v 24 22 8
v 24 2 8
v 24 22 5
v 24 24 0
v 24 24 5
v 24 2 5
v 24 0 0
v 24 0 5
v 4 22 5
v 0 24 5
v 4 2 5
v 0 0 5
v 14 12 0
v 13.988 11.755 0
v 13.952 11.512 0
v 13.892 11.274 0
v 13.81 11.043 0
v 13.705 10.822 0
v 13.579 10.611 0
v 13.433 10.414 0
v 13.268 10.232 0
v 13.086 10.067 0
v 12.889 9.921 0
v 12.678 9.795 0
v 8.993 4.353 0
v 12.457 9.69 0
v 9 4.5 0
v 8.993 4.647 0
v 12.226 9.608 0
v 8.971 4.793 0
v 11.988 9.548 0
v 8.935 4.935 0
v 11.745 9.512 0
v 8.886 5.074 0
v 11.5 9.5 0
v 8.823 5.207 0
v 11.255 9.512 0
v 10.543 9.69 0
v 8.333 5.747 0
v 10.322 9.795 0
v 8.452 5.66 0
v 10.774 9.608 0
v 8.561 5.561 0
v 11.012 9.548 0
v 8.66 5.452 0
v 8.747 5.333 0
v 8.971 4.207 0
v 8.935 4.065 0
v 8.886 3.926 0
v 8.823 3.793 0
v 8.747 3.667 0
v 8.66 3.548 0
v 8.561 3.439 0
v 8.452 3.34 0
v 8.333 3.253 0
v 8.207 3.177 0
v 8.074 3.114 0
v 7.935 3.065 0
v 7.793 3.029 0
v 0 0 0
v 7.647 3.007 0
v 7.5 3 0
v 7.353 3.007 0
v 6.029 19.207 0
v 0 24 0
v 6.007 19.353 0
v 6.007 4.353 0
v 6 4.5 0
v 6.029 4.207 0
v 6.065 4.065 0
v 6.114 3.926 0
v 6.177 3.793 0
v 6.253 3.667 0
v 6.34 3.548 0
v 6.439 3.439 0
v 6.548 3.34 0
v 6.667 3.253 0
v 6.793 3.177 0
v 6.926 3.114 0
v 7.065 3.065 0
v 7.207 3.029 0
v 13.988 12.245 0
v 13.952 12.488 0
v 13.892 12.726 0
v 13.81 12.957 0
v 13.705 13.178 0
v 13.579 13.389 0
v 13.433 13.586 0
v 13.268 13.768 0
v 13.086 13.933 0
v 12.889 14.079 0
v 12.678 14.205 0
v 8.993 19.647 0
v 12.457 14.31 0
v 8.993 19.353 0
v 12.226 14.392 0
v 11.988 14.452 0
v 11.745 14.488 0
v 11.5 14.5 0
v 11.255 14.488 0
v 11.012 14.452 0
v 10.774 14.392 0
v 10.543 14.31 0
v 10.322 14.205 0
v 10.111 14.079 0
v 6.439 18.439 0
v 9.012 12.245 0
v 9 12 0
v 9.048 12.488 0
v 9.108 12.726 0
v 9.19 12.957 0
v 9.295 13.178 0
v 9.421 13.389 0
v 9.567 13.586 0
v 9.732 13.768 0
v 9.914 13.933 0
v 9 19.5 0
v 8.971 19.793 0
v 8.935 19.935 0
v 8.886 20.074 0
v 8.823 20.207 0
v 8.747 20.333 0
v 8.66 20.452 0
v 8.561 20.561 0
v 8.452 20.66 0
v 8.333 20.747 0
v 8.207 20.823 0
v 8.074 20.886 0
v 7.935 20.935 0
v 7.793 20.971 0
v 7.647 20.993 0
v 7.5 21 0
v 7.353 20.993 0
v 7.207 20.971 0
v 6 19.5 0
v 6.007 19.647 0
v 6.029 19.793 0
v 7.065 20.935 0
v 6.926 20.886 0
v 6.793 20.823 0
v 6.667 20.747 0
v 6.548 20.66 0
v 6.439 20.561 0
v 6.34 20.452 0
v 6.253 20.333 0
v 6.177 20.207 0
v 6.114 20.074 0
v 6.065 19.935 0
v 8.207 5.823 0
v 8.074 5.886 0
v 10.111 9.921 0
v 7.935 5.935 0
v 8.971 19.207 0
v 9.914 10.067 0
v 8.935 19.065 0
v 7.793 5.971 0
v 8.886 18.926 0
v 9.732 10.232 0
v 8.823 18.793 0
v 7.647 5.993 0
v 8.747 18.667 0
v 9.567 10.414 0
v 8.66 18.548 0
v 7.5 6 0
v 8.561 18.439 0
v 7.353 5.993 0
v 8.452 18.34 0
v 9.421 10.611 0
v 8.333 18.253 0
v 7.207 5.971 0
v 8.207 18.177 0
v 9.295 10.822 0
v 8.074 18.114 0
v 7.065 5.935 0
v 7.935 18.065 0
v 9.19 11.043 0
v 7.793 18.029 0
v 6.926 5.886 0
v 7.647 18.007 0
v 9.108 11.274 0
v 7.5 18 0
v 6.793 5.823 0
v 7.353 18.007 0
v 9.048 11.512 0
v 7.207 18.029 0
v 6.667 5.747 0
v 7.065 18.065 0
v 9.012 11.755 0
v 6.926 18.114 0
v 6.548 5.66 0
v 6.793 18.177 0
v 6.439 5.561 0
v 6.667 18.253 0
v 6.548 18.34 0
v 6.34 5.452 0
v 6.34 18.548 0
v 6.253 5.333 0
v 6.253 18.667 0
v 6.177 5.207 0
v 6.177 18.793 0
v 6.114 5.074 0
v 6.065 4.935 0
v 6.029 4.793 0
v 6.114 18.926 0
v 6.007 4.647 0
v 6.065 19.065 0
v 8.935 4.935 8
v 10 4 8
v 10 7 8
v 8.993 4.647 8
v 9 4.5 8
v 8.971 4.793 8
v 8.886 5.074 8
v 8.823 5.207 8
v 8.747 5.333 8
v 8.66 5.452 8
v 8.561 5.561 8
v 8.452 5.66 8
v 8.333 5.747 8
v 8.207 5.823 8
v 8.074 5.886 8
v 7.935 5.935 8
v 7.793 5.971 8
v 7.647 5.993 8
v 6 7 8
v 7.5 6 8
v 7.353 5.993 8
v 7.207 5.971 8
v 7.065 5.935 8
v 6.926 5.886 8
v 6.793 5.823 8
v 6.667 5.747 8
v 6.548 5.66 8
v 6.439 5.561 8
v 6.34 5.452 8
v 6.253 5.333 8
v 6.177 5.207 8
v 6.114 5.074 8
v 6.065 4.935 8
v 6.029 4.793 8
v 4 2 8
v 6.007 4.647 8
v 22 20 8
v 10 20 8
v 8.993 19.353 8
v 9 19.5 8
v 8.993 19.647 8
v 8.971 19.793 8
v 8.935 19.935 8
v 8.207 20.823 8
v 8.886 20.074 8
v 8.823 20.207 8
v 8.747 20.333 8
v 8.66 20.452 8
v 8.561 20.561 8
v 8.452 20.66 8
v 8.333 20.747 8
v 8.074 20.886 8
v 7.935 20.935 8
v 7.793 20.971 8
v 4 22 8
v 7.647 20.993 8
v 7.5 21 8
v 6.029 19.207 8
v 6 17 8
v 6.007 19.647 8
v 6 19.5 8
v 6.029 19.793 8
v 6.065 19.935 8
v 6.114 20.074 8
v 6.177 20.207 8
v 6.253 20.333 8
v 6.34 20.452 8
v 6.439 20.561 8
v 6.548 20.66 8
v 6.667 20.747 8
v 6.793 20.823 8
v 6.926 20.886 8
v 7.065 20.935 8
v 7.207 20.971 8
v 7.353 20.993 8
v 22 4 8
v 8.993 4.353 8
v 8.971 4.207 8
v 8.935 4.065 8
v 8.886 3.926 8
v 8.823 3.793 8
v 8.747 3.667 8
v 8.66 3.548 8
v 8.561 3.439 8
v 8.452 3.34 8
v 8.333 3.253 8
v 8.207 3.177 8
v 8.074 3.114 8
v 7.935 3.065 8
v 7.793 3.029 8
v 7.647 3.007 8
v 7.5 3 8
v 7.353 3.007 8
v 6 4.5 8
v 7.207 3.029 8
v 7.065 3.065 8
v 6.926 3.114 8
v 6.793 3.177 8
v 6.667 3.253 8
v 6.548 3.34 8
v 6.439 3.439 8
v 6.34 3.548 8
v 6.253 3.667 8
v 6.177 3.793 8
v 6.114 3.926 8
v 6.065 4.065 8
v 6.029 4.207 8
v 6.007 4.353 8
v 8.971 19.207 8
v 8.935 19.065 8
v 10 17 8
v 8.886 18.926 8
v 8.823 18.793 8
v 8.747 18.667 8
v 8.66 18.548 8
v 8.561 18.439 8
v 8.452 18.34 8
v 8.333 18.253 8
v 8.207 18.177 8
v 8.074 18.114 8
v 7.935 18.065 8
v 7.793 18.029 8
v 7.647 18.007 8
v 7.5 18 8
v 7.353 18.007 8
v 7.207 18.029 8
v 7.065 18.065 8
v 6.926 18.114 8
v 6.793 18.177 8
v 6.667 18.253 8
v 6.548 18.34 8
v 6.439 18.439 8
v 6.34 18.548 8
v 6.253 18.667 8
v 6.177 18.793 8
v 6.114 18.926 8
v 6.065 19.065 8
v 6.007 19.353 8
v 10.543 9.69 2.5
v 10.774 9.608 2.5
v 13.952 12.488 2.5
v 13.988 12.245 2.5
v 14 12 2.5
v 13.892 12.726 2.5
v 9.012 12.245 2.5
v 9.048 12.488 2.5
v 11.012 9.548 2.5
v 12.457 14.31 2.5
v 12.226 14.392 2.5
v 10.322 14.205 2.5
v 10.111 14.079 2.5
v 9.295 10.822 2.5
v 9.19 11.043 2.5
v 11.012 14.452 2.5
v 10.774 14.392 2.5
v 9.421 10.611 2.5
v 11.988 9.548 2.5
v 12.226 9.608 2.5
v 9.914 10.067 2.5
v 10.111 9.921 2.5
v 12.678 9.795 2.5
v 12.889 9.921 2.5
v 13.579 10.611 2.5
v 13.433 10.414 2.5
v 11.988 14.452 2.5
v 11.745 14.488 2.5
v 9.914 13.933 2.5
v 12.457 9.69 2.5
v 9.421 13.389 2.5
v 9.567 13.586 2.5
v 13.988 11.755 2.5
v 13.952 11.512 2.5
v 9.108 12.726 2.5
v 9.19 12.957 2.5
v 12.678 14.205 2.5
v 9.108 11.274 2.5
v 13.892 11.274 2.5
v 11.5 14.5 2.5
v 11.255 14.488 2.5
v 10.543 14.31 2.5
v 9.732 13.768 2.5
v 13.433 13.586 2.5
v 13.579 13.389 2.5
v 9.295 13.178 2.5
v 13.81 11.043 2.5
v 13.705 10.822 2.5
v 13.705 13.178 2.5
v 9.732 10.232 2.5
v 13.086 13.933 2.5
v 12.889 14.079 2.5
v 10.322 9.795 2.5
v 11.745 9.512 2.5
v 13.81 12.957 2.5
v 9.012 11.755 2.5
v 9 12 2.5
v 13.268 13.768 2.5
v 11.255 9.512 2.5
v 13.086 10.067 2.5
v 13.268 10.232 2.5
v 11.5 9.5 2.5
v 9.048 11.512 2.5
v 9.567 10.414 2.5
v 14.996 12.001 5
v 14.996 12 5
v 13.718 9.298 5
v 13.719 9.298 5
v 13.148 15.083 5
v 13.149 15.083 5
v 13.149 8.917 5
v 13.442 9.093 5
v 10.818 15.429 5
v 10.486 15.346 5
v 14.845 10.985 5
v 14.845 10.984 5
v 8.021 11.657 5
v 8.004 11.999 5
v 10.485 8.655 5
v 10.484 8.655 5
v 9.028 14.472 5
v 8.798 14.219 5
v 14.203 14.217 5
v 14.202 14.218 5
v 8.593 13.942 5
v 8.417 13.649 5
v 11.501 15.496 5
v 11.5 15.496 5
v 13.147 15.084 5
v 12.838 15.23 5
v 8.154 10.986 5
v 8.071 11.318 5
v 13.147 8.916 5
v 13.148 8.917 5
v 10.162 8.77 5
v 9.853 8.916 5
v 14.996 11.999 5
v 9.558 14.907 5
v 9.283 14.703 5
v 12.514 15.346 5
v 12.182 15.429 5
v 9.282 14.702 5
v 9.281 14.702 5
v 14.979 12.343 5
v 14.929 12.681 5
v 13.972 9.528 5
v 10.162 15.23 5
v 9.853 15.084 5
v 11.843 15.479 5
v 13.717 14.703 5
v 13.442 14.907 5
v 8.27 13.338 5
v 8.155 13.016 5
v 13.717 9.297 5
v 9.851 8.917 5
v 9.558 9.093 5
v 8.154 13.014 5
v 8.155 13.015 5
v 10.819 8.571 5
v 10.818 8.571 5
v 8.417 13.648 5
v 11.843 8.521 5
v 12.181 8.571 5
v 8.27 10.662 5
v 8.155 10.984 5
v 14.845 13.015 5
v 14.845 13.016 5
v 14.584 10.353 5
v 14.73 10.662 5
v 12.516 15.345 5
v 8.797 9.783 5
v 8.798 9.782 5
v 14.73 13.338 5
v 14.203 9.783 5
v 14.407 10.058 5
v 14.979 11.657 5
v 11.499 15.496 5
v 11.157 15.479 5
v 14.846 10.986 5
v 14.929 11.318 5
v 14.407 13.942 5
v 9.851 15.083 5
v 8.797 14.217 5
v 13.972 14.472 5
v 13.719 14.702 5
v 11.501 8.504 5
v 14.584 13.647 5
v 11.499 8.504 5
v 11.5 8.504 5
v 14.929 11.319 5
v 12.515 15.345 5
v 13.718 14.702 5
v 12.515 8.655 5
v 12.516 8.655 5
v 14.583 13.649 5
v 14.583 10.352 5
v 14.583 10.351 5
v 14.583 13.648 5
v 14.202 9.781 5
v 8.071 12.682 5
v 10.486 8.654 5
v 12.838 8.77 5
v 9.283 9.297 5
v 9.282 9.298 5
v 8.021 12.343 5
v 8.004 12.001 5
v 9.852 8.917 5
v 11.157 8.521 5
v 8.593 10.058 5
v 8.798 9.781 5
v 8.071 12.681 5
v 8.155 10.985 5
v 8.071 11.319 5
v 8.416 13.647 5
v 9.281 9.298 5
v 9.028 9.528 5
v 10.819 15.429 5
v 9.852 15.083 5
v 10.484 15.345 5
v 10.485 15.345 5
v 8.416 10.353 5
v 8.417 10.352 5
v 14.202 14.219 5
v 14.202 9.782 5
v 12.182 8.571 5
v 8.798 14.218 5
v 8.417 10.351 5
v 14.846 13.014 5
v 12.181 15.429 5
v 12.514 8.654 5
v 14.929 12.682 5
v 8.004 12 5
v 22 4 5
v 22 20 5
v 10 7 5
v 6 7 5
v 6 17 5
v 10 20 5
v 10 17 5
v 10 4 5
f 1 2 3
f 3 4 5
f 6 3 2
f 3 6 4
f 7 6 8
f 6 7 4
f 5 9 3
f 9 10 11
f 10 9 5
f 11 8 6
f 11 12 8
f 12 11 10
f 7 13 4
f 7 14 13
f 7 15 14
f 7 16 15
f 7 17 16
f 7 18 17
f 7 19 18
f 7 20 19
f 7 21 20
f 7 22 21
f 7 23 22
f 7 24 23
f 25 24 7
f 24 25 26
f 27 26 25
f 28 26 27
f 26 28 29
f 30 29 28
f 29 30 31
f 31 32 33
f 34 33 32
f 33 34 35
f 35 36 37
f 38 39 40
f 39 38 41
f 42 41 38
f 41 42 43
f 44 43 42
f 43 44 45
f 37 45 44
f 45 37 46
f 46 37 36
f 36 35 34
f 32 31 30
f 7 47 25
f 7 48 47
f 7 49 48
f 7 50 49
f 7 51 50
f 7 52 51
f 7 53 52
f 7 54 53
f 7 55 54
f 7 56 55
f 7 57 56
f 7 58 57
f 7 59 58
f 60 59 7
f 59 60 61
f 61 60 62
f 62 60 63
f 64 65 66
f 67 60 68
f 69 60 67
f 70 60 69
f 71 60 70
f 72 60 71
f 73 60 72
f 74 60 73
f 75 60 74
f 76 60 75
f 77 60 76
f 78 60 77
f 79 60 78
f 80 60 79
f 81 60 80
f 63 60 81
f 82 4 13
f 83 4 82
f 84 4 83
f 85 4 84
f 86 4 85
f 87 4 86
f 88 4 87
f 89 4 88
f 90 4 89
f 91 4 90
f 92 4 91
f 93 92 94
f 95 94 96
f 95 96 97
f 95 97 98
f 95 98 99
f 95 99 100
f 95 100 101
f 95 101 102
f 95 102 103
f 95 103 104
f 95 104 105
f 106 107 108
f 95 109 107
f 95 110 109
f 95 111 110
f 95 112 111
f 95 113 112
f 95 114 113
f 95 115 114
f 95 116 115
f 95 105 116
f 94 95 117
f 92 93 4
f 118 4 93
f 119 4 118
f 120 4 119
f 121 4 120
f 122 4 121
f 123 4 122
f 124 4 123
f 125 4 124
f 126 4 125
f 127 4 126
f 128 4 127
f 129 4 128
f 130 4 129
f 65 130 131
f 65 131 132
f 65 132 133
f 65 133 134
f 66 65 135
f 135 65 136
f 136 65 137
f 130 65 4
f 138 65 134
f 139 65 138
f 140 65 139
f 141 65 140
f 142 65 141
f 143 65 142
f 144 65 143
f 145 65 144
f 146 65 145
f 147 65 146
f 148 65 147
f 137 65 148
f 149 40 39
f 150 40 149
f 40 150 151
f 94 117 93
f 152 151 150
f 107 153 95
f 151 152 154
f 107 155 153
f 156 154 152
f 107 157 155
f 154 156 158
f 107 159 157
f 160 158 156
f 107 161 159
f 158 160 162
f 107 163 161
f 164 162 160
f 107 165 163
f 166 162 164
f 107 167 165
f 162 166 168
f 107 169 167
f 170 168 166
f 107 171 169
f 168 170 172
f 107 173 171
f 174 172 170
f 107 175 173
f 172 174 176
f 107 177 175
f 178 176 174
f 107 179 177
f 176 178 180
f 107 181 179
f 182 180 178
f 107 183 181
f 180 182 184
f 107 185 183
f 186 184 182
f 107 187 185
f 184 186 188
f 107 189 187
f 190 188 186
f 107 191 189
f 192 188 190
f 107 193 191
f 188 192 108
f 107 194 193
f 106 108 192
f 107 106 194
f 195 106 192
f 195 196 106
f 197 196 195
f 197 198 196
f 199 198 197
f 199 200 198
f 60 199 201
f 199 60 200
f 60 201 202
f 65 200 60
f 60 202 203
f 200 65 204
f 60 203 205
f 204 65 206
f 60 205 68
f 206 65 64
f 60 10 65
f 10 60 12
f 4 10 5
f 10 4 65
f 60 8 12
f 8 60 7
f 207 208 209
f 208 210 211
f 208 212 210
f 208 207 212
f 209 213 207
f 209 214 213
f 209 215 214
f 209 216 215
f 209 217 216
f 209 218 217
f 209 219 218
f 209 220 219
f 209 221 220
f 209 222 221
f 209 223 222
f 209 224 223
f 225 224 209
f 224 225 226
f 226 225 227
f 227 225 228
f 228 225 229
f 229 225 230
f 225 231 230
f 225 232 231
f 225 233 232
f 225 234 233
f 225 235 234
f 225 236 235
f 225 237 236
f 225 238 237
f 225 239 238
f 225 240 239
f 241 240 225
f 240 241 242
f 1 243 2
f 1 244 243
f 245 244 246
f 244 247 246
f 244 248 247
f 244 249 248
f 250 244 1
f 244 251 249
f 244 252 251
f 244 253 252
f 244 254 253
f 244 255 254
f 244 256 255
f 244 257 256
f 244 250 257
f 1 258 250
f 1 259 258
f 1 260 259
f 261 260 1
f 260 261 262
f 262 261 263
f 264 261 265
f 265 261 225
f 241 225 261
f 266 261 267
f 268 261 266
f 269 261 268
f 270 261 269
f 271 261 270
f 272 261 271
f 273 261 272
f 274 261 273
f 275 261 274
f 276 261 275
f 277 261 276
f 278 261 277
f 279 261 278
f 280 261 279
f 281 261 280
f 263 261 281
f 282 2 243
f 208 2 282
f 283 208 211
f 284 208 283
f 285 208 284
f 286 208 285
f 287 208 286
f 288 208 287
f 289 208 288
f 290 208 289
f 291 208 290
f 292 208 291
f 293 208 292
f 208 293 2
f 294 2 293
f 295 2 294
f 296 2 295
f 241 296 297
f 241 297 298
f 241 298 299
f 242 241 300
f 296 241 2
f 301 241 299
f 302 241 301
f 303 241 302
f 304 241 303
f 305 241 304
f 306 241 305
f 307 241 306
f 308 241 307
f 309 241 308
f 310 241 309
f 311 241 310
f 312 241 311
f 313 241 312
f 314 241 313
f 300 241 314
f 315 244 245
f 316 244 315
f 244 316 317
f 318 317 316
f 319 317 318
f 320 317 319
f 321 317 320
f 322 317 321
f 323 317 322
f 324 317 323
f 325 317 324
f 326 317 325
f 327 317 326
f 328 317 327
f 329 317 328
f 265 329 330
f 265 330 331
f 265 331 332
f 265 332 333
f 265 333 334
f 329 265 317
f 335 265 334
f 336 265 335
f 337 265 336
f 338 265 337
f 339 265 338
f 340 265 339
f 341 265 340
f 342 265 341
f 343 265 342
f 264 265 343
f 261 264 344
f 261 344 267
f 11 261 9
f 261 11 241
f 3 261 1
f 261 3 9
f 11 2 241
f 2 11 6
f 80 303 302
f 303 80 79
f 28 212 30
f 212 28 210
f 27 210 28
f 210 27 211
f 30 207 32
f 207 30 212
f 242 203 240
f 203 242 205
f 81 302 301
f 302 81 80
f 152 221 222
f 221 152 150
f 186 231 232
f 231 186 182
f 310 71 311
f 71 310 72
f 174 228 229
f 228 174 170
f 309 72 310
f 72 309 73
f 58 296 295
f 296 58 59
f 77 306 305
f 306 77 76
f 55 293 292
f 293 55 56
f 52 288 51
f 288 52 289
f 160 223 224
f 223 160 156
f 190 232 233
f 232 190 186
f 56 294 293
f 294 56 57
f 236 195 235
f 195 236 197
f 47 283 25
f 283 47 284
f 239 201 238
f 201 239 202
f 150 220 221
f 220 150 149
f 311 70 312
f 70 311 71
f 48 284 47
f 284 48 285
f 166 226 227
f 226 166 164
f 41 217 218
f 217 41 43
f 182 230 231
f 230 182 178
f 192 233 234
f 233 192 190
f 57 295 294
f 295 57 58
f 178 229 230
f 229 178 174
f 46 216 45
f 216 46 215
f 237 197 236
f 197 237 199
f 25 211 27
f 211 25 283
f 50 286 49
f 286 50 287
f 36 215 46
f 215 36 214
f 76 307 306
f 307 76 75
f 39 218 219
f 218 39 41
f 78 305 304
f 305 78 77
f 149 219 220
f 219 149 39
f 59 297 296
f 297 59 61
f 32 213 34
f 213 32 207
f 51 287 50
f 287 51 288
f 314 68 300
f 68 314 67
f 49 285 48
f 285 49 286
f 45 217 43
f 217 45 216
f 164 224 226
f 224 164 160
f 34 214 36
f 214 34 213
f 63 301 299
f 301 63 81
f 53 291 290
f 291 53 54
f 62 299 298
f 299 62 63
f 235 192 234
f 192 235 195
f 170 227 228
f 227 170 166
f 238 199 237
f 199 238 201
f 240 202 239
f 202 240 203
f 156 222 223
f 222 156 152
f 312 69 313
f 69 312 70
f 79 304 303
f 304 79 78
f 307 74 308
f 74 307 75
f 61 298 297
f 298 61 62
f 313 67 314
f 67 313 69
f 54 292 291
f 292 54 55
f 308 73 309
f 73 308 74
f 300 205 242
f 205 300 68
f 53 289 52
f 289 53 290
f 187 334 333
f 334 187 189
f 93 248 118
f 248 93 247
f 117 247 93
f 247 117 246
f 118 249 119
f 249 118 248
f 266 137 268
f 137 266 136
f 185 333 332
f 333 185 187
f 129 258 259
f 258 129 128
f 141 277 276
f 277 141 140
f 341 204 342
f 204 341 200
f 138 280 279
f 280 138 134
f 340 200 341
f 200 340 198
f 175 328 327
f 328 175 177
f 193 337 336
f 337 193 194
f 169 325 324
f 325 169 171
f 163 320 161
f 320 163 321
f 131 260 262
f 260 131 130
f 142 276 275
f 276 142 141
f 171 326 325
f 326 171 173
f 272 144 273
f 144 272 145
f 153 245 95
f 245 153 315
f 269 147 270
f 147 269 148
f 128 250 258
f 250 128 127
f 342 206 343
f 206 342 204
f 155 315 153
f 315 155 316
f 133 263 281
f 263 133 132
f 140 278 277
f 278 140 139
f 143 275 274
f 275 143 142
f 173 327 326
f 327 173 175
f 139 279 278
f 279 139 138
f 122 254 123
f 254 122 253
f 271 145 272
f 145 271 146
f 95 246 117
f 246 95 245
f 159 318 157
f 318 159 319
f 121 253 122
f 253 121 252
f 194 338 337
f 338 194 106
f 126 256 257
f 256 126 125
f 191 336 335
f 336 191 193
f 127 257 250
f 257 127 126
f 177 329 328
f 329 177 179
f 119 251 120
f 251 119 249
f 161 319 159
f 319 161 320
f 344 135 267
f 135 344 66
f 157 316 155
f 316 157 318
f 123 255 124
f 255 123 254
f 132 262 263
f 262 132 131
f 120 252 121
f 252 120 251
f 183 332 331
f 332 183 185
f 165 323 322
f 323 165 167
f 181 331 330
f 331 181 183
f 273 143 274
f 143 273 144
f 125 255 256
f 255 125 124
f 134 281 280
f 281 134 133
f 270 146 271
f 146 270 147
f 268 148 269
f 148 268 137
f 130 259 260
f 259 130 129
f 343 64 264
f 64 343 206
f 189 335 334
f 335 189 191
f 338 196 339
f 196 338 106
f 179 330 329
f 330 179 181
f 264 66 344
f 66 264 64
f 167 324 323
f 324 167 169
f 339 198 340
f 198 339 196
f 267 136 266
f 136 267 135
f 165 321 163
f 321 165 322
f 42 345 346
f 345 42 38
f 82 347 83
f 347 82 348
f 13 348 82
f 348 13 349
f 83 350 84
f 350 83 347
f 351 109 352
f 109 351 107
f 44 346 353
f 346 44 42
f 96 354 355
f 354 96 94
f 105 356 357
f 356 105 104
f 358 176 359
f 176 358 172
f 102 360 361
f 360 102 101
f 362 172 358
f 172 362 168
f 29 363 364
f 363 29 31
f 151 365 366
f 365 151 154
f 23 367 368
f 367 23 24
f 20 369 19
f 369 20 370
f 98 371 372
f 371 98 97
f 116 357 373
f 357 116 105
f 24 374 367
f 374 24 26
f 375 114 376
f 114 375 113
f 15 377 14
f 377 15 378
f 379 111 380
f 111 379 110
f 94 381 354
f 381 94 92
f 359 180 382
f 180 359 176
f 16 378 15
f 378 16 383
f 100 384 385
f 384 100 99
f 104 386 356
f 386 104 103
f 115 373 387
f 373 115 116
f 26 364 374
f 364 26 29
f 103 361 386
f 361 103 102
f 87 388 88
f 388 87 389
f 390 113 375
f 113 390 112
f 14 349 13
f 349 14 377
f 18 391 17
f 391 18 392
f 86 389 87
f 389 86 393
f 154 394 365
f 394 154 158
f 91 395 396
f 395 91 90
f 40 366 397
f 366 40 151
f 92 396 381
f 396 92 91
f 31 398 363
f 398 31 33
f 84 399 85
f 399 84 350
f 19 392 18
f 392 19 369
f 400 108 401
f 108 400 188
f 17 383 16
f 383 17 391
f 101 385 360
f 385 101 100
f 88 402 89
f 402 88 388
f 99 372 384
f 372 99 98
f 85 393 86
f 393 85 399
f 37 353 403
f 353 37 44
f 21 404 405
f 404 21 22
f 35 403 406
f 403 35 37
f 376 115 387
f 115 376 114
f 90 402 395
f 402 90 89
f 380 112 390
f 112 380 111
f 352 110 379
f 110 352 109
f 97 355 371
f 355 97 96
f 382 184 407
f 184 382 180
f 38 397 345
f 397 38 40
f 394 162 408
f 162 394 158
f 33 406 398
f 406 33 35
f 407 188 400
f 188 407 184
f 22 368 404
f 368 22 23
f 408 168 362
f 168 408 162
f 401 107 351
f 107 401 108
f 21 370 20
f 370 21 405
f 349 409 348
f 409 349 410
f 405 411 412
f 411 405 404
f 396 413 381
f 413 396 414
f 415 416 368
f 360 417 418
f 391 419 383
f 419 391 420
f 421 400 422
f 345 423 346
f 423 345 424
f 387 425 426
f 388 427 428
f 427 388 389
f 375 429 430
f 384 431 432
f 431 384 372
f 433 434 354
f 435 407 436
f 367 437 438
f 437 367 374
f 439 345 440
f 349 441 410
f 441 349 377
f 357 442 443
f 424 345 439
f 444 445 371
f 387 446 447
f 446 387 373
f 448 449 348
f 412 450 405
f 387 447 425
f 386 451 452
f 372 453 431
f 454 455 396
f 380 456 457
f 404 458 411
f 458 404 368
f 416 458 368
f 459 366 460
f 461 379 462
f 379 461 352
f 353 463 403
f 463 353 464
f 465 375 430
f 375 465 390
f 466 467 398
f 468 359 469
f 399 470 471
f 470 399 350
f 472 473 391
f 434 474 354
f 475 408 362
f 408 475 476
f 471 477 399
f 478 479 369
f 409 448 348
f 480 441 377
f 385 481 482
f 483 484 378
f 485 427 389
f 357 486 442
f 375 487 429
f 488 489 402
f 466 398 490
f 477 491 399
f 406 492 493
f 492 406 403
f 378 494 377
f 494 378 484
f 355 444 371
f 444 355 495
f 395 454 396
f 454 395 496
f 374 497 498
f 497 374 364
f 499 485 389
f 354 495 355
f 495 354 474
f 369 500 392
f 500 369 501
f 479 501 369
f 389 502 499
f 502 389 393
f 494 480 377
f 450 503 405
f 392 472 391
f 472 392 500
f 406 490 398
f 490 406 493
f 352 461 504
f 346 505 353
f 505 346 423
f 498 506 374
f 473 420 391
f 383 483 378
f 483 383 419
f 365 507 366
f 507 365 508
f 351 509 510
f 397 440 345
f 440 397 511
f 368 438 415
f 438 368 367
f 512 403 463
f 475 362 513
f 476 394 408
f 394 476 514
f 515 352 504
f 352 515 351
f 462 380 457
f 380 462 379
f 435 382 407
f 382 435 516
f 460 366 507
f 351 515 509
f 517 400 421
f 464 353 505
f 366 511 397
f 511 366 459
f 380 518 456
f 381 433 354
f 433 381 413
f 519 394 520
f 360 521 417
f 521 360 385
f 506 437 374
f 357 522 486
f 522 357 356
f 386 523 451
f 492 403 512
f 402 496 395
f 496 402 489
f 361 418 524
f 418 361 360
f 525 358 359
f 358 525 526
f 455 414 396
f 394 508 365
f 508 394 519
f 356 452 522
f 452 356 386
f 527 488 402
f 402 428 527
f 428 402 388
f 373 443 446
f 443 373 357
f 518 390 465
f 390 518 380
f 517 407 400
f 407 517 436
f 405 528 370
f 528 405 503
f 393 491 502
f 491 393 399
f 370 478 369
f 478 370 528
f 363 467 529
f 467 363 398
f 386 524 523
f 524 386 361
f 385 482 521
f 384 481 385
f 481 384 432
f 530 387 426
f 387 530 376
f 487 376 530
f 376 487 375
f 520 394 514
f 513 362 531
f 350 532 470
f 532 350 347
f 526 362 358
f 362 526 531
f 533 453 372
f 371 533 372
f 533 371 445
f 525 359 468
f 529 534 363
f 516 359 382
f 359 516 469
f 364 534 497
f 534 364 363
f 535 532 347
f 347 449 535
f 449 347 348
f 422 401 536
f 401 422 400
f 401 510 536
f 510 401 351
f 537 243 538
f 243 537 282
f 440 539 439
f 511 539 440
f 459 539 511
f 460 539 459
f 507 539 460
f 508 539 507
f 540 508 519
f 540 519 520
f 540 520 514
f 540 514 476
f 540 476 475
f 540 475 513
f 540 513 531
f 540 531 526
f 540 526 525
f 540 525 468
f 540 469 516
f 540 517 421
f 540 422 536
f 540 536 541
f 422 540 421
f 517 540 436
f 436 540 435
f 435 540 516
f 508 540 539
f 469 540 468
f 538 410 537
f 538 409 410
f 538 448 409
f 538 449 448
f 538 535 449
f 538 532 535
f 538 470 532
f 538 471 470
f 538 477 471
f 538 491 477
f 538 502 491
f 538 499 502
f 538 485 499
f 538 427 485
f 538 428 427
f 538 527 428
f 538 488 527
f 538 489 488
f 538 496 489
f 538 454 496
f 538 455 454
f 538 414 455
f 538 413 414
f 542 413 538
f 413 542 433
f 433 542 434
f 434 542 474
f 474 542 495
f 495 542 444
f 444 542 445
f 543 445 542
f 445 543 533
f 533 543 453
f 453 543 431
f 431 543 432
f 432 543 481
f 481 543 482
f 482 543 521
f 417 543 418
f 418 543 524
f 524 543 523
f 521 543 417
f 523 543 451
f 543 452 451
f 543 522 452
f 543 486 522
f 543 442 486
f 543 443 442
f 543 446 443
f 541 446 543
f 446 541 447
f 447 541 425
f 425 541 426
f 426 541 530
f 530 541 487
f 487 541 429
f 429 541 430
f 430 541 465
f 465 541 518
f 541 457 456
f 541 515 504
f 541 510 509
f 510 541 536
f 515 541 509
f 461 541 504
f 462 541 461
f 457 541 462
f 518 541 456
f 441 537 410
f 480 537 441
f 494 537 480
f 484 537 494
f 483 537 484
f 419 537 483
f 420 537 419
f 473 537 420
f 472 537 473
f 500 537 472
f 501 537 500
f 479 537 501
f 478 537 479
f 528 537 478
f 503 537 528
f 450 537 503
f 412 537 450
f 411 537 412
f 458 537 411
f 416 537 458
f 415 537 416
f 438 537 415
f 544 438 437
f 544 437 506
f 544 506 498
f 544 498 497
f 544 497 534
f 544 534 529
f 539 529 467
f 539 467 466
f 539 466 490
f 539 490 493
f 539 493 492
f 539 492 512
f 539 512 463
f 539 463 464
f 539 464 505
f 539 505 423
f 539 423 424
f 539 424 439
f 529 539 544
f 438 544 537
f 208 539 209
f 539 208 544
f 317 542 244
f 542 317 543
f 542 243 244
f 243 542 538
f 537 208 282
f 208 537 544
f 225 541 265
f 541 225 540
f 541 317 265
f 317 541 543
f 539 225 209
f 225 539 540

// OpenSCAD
$fn=64;

difference() {
  union() {
    cube([24,24,5]);
    translate([4,2,5]) cube([20,20,3]);
  }

  translate([7.5,4.5,-0.1]) cylinder(r=1.5,h=8.2);
  translate([7.5,19.5,-0.1]) cylinder(r=1.5,h=8.2);
  translate([11.5,12,-0.1]) cylinder(r=2.5,h=2.7);
  translate([11.5,12,2.5]) cylinder(r1=2.5,r2=3.5,h=2.51);

  translate([10,4,5]) cube([12,16,3.1]);
  translate([6,7,5]) cube([4.1,10,3.1]);

}
